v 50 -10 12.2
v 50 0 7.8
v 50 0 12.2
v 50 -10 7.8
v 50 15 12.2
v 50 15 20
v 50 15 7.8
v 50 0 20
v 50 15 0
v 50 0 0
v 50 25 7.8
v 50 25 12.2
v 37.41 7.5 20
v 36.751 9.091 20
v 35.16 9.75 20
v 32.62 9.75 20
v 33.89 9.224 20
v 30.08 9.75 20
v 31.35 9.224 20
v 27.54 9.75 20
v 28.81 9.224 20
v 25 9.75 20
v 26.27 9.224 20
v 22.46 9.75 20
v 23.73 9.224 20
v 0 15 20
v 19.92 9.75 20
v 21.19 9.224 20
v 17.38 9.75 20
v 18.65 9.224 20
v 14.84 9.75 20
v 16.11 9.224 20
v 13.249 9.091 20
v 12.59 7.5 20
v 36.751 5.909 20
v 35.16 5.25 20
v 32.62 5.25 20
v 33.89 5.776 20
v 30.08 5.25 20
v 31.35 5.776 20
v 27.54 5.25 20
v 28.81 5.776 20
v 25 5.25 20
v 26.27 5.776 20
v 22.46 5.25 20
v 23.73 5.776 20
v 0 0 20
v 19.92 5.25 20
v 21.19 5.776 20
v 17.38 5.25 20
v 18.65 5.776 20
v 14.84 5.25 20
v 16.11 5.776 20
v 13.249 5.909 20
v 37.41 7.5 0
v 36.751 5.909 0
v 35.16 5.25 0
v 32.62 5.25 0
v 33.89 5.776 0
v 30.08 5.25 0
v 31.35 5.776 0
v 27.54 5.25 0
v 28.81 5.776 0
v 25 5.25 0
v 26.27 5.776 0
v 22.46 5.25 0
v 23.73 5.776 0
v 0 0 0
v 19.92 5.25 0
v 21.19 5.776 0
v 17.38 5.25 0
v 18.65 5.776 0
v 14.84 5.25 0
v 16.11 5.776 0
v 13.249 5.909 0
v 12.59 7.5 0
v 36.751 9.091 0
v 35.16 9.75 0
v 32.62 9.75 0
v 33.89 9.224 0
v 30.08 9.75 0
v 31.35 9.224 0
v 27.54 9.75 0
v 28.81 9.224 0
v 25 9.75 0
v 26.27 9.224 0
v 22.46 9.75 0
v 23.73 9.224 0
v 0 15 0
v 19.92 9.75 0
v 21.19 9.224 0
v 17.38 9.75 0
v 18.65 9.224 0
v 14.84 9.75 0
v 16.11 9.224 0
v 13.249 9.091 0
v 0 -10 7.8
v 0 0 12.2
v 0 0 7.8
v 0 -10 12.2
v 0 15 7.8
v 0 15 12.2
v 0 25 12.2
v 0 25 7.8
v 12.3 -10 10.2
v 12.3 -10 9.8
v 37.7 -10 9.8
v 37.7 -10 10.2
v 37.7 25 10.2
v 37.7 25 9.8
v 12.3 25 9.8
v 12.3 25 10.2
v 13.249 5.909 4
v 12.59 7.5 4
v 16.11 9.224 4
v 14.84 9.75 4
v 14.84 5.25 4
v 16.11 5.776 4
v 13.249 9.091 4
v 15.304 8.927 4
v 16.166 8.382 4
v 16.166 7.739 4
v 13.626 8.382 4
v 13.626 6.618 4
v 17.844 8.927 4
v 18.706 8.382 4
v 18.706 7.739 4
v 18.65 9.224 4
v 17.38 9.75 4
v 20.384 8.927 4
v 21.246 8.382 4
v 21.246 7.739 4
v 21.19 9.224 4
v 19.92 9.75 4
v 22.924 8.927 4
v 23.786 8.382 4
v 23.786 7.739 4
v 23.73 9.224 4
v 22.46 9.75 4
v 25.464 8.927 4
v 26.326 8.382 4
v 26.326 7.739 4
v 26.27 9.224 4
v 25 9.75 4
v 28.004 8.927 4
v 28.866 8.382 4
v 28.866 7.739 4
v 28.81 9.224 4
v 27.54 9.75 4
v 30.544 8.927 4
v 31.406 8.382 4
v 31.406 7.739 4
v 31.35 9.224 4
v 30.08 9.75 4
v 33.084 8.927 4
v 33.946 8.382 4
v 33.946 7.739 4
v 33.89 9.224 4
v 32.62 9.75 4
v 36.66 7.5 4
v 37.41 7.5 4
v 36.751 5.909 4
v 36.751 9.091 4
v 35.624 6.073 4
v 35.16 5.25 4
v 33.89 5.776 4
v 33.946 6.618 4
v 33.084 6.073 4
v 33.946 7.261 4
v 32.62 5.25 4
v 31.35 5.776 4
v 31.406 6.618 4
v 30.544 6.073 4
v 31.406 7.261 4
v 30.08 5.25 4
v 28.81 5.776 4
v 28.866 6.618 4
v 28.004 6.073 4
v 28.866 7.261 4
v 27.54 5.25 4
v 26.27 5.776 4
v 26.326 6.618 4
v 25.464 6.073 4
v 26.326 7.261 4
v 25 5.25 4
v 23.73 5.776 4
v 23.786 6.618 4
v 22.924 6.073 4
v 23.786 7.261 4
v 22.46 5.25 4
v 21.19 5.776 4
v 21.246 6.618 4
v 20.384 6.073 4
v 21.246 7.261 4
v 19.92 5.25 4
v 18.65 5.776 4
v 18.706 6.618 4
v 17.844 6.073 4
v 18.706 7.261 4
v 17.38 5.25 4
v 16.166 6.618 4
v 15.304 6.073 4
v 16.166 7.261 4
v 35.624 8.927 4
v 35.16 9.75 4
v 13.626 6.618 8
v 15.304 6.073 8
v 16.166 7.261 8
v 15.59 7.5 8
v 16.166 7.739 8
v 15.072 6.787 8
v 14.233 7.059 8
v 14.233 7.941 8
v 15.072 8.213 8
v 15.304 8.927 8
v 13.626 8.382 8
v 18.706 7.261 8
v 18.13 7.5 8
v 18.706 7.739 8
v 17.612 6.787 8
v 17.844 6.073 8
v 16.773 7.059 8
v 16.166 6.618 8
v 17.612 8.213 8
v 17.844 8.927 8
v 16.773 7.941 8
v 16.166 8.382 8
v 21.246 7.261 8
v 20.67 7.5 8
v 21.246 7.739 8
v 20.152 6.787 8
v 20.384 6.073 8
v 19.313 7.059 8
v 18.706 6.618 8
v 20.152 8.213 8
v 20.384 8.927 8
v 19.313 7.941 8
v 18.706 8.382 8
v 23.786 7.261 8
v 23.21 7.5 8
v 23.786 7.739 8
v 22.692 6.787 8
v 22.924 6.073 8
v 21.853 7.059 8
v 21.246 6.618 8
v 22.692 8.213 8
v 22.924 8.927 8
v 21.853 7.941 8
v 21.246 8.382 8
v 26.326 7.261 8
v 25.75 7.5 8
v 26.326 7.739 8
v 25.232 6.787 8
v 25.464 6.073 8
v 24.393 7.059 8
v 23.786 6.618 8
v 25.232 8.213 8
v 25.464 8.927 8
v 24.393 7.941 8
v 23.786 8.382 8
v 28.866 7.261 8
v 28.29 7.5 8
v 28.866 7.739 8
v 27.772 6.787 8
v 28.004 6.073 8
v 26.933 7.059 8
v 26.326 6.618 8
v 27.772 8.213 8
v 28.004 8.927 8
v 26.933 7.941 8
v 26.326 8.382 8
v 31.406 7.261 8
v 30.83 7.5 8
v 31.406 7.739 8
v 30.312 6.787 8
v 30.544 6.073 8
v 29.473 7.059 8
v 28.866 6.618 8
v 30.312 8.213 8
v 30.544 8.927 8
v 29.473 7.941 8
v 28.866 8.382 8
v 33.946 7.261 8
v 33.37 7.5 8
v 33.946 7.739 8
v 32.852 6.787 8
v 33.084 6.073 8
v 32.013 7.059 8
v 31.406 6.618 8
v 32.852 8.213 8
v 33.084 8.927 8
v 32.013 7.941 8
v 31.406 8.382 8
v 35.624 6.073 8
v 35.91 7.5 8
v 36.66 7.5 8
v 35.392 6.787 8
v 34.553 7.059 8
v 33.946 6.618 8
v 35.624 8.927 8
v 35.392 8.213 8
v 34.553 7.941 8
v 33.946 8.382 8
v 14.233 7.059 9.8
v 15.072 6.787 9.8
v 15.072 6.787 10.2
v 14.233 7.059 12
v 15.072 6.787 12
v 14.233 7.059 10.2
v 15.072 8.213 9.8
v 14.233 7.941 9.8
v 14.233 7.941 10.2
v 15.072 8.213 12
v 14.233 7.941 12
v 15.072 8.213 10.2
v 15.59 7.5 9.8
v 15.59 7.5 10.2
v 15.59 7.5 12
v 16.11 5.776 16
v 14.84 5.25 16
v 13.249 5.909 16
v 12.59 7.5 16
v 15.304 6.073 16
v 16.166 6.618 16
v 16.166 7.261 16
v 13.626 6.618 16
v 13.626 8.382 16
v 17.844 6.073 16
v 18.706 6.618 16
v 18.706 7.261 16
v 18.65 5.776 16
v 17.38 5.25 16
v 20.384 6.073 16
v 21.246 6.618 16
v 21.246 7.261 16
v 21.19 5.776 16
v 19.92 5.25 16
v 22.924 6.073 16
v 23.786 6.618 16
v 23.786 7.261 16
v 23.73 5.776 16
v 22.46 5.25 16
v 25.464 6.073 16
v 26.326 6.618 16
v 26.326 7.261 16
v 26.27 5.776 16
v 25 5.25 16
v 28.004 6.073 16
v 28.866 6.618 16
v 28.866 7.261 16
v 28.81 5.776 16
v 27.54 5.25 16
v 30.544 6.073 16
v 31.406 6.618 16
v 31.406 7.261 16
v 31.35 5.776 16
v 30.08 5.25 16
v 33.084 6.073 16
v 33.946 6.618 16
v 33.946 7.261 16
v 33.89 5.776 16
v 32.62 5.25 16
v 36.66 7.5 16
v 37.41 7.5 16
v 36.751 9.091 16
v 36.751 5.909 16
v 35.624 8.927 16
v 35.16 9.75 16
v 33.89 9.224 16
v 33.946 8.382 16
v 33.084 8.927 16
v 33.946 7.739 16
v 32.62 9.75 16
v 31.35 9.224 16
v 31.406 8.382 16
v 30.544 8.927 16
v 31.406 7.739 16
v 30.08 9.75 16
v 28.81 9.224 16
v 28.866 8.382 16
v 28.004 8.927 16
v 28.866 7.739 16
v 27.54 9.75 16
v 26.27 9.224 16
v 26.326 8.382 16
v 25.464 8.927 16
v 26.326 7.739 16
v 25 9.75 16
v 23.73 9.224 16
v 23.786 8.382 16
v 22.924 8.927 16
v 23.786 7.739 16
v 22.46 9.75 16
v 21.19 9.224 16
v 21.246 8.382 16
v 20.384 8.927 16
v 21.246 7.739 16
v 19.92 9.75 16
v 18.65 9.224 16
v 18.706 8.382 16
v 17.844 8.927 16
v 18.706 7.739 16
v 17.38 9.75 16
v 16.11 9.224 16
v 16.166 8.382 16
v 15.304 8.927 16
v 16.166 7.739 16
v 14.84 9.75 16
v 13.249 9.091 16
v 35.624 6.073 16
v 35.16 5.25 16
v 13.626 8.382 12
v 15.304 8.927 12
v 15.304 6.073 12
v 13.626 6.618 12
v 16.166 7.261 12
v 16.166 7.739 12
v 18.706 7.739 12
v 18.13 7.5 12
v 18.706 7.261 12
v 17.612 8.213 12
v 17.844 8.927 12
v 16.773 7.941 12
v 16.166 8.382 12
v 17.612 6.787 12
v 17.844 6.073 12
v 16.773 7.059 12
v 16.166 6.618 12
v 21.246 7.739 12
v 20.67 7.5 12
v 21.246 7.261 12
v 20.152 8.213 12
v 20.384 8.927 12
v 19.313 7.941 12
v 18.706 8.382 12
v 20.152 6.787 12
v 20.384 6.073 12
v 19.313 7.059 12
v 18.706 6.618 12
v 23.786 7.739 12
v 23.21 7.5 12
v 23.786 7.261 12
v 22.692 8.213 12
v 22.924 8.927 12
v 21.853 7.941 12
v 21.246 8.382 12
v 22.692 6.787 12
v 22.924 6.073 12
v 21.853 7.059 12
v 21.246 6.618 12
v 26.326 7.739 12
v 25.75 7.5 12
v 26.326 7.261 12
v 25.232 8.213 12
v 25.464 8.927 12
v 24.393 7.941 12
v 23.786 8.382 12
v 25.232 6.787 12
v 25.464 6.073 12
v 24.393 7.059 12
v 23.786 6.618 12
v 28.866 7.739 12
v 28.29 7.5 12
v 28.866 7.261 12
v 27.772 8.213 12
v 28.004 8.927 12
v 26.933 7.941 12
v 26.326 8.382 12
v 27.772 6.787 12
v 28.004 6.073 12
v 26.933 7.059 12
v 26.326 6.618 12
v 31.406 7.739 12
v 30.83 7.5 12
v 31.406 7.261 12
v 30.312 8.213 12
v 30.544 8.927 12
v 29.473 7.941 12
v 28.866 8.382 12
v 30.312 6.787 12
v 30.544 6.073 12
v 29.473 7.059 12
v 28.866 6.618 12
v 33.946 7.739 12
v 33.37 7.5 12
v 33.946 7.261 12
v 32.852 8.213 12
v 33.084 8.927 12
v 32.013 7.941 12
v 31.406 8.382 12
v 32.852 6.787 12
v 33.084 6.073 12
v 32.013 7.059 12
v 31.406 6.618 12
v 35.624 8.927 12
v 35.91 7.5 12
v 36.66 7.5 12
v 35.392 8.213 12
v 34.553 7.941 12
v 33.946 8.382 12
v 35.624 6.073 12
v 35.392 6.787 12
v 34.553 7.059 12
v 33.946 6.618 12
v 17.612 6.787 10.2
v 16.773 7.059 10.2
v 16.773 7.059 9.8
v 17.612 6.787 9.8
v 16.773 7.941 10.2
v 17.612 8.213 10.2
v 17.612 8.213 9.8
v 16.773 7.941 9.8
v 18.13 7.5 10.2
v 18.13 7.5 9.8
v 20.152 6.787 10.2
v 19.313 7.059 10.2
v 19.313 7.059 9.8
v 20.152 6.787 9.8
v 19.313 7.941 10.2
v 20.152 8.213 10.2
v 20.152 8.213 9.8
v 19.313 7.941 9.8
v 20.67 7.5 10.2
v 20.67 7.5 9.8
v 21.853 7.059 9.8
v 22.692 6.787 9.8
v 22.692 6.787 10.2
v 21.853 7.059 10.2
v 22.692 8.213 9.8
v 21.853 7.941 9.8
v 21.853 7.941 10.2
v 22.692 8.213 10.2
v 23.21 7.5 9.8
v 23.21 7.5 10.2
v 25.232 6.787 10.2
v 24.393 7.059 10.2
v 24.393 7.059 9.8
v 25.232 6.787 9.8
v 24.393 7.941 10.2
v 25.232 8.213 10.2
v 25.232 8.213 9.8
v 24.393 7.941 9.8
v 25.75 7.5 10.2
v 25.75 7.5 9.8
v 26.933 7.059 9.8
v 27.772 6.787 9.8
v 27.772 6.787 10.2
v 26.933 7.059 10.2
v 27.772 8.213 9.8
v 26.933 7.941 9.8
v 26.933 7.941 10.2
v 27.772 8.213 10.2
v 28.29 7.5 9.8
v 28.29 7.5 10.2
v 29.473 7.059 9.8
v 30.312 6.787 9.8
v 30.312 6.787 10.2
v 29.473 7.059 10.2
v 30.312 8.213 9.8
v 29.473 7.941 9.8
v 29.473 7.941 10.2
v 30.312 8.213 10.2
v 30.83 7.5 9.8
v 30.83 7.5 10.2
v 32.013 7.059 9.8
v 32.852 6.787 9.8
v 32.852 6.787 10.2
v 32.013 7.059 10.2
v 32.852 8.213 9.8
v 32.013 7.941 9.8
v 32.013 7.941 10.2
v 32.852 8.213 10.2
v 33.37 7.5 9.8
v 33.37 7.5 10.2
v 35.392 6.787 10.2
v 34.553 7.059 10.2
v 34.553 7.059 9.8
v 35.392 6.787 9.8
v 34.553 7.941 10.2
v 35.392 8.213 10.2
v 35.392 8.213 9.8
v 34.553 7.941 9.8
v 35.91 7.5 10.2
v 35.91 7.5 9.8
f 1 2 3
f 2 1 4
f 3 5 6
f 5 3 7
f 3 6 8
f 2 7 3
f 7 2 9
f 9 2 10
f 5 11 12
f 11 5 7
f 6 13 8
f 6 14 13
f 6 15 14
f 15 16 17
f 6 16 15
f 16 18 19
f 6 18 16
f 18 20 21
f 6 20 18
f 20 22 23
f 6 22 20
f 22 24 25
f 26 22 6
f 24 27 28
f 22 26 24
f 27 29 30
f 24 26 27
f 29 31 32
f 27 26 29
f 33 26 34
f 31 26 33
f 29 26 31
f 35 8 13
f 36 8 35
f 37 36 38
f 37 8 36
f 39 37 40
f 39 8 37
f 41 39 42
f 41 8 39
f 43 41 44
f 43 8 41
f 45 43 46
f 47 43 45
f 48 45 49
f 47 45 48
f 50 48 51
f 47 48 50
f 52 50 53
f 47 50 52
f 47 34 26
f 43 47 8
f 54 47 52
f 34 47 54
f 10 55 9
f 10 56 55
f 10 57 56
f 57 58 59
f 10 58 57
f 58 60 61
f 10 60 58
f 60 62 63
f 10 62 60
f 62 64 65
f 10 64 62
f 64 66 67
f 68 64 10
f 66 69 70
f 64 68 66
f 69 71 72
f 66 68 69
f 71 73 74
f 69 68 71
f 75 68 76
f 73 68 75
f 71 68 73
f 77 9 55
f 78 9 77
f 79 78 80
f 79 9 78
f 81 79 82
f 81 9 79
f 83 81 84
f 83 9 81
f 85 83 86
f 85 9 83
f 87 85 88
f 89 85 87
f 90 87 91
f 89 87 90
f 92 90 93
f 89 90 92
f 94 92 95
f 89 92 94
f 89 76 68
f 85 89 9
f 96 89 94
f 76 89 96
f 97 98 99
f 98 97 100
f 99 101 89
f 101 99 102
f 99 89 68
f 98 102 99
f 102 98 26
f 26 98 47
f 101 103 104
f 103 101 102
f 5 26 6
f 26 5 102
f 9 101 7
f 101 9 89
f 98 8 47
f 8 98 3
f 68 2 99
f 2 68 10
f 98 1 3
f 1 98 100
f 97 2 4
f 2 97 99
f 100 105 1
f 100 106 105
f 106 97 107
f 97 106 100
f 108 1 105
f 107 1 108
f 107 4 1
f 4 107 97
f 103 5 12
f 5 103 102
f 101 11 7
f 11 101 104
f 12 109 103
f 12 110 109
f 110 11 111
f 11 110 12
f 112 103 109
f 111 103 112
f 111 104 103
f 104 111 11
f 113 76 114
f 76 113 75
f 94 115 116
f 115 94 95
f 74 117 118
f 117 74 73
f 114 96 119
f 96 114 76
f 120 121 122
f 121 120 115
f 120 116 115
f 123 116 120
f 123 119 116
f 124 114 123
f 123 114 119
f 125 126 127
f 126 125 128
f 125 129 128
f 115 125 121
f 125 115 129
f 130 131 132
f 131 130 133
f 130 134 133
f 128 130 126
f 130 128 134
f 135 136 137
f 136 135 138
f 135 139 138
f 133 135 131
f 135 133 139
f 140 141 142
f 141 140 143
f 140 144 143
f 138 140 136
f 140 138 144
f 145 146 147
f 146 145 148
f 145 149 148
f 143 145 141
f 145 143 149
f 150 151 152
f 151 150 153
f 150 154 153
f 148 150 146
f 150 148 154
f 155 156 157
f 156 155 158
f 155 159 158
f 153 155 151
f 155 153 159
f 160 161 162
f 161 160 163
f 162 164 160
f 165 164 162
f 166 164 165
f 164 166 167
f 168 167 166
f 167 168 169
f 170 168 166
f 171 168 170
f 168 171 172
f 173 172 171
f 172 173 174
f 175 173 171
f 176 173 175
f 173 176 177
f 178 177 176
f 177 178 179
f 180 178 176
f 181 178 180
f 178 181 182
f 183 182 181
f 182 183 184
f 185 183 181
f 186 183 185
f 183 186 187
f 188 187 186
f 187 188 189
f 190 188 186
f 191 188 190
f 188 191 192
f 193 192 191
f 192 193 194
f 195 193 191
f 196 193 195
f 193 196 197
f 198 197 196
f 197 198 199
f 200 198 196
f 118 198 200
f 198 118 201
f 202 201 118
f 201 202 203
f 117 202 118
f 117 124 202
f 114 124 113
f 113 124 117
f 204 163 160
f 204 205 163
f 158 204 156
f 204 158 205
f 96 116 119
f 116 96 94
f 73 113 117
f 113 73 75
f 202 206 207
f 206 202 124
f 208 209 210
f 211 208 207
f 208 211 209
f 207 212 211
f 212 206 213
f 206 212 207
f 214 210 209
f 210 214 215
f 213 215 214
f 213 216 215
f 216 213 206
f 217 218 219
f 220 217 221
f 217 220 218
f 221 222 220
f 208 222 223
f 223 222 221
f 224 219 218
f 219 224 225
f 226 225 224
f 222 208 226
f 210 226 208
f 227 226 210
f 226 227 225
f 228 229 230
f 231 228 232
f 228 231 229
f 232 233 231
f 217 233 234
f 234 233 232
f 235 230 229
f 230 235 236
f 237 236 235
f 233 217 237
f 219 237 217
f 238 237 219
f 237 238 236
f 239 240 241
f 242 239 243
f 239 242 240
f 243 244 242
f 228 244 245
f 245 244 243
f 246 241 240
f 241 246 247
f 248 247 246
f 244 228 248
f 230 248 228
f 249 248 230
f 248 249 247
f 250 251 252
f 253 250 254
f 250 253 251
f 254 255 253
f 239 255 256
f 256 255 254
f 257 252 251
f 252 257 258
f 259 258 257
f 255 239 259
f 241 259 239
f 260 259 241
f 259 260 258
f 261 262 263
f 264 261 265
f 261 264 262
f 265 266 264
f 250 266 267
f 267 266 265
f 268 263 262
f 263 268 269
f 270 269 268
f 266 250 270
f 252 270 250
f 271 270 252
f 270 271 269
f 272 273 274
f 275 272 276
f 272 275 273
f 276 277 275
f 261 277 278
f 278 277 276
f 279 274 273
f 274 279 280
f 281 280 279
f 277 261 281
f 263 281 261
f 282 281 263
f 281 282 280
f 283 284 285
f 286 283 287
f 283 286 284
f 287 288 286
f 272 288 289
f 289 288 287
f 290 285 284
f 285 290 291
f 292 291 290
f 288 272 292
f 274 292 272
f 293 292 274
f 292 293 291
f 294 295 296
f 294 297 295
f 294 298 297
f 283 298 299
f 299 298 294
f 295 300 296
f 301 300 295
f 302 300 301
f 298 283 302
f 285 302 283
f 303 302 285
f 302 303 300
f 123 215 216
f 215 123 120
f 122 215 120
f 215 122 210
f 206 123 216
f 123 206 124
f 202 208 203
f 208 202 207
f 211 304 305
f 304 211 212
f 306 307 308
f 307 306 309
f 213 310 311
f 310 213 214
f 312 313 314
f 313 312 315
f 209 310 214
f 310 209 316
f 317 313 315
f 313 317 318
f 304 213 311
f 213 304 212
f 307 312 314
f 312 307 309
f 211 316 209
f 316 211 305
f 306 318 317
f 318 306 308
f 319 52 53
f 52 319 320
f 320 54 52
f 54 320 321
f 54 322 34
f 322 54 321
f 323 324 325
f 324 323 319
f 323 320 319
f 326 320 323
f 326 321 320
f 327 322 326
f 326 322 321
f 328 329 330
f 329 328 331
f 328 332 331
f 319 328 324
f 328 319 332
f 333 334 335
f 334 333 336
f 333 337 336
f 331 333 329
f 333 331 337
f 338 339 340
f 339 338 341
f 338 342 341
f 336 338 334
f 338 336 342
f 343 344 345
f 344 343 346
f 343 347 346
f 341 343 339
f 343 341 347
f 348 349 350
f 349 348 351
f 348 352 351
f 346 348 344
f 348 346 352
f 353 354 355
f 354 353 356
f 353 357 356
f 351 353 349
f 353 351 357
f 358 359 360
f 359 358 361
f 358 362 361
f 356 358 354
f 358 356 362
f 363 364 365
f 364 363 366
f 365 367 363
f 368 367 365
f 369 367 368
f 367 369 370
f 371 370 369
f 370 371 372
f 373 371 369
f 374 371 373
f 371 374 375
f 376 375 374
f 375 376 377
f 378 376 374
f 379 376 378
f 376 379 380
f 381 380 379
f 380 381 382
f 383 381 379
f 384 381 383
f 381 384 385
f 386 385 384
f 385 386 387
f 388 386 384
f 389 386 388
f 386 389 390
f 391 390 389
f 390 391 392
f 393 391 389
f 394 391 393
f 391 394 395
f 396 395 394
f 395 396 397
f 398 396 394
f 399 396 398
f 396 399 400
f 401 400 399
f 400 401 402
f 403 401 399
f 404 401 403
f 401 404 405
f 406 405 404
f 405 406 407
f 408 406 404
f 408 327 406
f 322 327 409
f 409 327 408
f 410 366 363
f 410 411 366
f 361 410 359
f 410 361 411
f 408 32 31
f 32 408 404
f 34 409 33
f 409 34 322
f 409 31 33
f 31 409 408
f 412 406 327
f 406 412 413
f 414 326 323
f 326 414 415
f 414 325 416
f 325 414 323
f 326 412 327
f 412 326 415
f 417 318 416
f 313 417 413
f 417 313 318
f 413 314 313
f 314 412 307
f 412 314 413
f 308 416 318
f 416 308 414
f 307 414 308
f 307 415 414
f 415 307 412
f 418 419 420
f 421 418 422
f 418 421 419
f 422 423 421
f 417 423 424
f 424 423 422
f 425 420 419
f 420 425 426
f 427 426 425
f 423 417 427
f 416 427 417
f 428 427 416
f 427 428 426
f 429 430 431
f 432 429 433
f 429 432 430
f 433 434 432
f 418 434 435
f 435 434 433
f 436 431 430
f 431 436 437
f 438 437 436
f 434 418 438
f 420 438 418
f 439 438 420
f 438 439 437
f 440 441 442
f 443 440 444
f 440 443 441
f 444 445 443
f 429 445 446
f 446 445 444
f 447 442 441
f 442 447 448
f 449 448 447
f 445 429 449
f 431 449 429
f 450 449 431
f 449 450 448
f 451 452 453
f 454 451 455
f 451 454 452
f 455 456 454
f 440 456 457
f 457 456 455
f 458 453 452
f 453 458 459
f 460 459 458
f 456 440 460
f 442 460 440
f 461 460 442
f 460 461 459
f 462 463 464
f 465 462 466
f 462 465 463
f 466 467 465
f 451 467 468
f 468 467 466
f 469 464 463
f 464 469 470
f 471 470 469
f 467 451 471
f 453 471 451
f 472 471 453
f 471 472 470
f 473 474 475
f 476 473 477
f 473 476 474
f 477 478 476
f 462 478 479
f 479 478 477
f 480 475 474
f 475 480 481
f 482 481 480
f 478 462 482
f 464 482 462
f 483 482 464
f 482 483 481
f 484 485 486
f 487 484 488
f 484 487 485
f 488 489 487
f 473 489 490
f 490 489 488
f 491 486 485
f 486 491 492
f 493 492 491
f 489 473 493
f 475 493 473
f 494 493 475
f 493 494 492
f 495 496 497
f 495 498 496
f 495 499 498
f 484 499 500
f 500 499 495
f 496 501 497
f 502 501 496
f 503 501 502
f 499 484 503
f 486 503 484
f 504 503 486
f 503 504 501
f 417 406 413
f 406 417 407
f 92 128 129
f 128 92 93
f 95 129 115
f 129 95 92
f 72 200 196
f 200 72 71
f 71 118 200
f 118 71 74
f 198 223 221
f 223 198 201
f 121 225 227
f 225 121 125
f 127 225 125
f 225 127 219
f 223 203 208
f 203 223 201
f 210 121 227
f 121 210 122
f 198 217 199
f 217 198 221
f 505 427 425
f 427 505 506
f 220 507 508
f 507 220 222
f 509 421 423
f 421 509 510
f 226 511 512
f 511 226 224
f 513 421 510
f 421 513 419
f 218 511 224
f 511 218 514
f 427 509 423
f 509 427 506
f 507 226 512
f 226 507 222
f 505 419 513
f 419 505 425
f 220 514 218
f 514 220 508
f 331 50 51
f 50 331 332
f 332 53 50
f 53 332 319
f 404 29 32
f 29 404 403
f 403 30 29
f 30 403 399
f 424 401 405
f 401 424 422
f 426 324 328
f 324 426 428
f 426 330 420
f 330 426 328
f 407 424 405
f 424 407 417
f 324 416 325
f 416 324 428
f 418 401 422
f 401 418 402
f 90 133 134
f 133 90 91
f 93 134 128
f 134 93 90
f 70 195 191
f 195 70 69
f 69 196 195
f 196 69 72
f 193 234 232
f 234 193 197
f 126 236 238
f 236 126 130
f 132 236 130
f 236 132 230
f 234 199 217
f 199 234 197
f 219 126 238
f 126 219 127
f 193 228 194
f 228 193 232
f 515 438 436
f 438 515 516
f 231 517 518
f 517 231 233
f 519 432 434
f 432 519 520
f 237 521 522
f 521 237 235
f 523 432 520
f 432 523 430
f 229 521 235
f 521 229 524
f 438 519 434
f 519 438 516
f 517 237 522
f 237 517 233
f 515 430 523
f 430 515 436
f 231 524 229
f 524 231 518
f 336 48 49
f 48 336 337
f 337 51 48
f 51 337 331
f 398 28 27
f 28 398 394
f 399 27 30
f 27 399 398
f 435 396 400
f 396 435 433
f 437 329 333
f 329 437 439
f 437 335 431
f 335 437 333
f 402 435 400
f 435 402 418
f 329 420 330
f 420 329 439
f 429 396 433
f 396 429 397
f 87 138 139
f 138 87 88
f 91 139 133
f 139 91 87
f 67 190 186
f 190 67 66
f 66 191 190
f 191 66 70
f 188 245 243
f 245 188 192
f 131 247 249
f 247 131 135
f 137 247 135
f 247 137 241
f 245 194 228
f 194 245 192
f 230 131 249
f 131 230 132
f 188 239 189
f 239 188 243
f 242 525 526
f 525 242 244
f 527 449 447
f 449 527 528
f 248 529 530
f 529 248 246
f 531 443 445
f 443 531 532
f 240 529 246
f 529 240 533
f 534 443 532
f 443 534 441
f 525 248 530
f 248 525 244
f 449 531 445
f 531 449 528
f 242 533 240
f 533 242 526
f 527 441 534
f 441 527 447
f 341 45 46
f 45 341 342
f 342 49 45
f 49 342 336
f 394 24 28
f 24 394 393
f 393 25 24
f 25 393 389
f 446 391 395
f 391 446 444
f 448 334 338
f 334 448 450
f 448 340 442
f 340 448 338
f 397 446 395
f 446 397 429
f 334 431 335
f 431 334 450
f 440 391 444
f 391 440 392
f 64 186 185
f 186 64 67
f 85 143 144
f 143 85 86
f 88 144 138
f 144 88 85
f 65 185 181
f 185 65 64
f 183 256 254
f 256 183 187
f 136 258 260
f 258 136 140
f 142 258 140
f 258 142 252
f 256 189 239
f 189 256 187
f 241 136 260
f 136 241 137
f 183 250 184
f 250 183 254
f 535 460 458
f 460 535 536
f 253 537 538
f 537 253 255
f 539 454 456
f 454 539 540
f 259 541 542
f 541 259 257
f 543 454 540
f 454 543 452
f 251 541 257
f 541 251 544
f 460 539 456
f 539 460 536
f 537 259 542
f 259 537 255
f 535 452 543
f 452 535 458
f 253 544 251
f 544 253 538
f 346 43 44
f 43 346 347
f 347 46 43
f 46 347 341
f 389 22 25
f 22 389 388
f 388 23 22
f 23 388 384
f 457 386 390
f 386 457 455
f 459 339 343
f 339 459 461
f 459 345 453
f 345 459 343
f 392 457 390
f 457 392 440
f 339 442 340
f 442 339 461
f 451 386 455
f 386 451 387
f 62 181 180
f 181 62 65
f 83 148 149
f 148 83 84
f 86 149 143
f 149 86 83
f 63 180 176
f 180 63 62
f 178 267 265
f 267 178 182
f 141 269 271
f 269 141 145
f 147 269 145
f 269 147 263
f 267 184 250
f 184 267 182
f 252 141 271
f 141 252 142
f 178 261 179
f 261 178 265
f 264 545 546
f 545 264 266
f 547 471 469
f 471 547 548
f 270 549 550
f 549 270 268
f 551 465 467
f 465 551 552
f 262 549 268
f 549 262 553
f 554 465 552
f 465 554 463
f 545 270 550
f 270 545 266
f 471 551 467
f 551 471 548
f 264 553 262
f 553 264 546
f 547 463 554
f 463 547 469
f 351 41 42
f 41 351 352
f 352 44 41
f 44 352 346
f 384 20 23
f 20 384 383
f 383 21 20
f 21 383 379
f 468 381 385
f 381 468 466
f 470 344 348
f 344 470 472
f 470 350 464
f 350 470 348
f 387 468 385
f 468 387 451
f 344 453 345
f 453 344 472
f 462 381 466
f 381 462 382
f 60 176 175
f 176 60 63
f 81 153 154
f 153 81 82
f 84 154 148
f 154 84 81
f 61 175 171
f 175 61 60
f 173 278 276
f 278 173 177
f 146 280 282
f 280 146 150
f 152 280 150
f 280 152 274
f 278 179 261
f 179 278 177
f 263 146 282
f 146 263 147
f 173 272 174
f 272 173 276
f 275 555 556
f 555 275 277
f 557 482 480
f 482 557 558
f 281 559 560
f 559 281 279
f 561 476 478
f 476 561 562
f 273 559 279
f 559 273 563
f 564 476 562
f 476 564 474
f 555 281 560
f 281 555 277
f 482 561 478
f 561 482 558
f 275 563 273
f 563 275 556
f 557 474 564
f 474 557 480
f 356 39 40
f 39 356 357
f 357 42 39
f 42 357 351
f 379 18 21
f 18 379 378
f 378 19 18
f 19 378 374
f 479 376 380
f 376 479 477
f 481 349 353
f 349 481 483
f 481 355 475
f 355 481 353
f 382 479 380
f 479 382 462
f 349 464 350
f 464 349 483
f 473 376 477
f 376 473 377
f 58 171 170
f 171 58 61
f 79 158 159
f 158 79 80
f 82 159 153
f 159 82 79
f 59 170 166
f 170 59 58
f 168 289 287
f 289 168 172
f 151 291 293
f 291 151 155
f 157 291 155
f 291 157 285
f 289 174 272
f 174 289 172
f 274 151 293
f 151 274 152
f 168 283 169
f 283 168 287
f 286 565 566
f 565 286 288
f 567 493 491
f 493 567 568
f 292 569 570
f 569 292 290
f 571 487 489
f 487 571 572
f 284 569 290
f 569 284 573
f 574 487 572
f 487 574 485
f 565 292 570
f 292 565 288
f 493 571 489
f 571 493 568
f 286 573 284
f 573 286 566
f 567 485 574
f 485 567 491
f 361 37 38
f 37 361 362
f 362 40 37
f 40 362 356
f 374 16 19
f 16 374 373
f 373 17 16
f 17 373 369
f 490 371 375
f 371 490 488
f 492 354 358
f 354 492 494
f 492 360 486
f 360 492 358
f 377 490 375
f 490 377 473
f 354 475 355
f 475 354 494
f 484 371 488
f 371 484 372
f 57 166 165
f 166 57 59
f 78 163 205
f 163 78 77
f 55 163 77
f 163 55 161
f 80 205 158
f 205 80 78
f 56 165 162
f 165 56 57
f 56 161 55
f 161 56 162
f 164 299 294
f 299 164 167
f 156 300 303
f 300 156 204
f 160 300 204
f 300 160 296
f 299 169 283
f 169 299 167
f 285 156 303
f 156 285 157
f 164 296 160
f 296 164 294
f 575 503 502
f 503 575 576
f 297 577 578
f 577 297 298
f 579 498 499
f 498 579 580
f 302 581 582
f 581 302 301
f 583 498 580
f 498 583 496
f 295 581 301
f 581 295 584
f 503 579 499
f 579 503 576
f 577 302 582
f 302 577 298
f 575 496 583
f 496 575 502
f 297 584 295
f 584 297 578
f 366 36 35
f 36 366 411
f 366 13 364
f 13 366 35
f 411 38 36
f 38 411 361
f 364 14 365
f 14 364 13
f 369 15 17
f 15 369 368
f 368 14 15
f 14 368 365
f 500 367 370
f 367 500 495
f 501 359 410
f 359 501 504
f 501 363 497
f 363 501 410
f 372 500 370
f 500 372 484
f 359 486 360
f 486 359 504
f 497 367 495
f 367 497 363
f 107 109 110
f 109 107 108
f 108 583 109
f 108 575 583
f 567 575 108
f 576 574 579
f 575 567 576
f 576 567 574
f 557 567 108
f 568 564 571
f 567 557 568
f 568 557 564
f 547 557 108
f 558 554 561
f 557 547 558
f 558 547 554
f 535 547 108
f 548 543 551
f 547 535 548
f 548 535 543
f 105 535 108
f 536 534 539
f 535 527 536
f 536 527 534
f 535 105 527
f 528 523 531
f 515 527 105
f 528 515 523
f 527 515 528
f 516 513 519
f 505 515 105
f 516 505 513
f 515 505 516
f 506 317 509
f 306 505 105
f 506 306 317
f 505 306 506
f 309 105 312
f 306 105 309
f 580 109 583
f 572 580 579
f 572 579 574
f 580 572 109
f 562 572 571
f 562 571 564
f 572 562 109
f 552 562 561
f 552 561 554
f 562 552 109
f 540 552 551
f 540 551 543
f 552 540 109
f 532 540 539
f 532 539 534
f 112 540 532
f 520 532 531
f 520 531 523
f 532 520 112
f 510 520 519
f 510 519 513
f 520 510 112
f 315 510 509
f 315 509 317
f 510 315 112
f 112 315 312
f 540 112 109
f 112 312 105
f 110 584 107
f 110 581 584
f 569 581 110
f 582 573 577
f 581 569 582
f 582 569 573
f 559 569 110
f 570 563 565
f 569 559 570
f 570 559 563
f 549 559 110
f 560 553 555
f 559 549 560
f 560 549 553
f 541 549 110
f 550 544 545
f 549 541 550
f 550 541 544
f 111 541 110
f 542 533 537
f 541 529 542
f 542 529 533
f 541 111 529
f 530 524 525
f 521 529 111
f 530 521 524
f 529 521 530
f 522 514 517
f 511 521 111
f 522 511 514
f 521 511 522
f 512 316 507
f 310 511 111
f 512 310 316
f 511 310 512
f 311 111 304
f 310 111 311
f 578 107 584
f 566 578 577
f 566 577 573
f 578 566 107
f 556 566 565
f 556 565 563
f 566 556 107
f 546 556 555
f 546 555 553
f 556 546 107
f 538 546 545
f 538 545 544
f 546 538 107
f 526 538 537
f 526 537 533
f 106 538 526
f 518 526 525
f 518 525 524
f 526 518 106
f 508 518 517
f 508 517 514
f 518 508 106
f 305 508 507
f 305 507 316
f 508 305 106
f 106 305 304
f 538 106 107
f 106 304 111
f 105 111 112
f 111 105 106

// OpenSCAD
led_rand_diam = 4.5;
led_rand_height = 4;
led_body_diam = 3;
led_body_height = 4;
led_beam_diam = 1.5;
led_beam_height = 2;

led_spacing = 2.54;

nr_of_dots = 9;

box_width = 50;
box_depth = 15;
box_height = 20;

slide_width = 25.4;
slide_height = 0.4;
slide_depth = 10;
slide_thickness = 2;

slide_x = (box_width - slide_width - slide_thickness) / 2;
slide_z = (box_height - slide_height - 2 * slide_thickness) / 2;
slide_outer_width = slide_width + 2 * slide_thickness;

module led(x = 0, y = 0, z = 0)
{
    
    translate([x, y, z])
    {
        // Led rand.
        cylinder(h = led_rand_height, r1 = led_rand_diam / 2, r2 = led_rand_diam / 2);
        
    } 
        
    // Led body.
    translate([x, y, z + led_rand_height])
    {
        cylinder(h = led_body_height, r1 = led_body_diam / 2, r2 = led_body_diam / 2);
    }
        
    // lead beam.
    translate([x, y, z + led_rand_height + led_body_height])
    {
        cylinder(h = led_beam_height, r1 = led_beam_diam / 2, r2 = led_beam_diam / 2);
    }

}

difference()
{
    union()
    { 
        // Main box.
        cube(size = [box_width, box_depth, box_height]);
        
        // Slide left.
        translate([0, -slide_depth, slide_z])
            cube(size = [box_width,
                slide_depth, 
                slide_height + 2 * slide_thickness]);

        // Slide right.
        translate([0, box_depth, slide_z])
            cube(size = [box_width,
                slide_depth, 
                slide_height + 2 * slide_thickness]);
                
    }
    
    slide_x = (box_width - slide_width) / 2;

    // slide opening.
    translate([slide_x,
            -slide_depth, 
            (box_height - slide_height) / 2])
        cube(size = [slide_width, 
            slide_depth + slide_depth + box_depth, slide_height]);
    
    // Row of IR Leds.
    for (x = [slide_x + led_spacing : 2.54 : box_width - slide_x -      led_spacing])
    {
        led(x, box_depth / 2, 0);
        //led_rand_height + led_body_height + led_beam_height);
        
        rotate(a = [180, 0, 0])
            led(x, -(box_depth / 2), -box_height);
        
    }
    
}
